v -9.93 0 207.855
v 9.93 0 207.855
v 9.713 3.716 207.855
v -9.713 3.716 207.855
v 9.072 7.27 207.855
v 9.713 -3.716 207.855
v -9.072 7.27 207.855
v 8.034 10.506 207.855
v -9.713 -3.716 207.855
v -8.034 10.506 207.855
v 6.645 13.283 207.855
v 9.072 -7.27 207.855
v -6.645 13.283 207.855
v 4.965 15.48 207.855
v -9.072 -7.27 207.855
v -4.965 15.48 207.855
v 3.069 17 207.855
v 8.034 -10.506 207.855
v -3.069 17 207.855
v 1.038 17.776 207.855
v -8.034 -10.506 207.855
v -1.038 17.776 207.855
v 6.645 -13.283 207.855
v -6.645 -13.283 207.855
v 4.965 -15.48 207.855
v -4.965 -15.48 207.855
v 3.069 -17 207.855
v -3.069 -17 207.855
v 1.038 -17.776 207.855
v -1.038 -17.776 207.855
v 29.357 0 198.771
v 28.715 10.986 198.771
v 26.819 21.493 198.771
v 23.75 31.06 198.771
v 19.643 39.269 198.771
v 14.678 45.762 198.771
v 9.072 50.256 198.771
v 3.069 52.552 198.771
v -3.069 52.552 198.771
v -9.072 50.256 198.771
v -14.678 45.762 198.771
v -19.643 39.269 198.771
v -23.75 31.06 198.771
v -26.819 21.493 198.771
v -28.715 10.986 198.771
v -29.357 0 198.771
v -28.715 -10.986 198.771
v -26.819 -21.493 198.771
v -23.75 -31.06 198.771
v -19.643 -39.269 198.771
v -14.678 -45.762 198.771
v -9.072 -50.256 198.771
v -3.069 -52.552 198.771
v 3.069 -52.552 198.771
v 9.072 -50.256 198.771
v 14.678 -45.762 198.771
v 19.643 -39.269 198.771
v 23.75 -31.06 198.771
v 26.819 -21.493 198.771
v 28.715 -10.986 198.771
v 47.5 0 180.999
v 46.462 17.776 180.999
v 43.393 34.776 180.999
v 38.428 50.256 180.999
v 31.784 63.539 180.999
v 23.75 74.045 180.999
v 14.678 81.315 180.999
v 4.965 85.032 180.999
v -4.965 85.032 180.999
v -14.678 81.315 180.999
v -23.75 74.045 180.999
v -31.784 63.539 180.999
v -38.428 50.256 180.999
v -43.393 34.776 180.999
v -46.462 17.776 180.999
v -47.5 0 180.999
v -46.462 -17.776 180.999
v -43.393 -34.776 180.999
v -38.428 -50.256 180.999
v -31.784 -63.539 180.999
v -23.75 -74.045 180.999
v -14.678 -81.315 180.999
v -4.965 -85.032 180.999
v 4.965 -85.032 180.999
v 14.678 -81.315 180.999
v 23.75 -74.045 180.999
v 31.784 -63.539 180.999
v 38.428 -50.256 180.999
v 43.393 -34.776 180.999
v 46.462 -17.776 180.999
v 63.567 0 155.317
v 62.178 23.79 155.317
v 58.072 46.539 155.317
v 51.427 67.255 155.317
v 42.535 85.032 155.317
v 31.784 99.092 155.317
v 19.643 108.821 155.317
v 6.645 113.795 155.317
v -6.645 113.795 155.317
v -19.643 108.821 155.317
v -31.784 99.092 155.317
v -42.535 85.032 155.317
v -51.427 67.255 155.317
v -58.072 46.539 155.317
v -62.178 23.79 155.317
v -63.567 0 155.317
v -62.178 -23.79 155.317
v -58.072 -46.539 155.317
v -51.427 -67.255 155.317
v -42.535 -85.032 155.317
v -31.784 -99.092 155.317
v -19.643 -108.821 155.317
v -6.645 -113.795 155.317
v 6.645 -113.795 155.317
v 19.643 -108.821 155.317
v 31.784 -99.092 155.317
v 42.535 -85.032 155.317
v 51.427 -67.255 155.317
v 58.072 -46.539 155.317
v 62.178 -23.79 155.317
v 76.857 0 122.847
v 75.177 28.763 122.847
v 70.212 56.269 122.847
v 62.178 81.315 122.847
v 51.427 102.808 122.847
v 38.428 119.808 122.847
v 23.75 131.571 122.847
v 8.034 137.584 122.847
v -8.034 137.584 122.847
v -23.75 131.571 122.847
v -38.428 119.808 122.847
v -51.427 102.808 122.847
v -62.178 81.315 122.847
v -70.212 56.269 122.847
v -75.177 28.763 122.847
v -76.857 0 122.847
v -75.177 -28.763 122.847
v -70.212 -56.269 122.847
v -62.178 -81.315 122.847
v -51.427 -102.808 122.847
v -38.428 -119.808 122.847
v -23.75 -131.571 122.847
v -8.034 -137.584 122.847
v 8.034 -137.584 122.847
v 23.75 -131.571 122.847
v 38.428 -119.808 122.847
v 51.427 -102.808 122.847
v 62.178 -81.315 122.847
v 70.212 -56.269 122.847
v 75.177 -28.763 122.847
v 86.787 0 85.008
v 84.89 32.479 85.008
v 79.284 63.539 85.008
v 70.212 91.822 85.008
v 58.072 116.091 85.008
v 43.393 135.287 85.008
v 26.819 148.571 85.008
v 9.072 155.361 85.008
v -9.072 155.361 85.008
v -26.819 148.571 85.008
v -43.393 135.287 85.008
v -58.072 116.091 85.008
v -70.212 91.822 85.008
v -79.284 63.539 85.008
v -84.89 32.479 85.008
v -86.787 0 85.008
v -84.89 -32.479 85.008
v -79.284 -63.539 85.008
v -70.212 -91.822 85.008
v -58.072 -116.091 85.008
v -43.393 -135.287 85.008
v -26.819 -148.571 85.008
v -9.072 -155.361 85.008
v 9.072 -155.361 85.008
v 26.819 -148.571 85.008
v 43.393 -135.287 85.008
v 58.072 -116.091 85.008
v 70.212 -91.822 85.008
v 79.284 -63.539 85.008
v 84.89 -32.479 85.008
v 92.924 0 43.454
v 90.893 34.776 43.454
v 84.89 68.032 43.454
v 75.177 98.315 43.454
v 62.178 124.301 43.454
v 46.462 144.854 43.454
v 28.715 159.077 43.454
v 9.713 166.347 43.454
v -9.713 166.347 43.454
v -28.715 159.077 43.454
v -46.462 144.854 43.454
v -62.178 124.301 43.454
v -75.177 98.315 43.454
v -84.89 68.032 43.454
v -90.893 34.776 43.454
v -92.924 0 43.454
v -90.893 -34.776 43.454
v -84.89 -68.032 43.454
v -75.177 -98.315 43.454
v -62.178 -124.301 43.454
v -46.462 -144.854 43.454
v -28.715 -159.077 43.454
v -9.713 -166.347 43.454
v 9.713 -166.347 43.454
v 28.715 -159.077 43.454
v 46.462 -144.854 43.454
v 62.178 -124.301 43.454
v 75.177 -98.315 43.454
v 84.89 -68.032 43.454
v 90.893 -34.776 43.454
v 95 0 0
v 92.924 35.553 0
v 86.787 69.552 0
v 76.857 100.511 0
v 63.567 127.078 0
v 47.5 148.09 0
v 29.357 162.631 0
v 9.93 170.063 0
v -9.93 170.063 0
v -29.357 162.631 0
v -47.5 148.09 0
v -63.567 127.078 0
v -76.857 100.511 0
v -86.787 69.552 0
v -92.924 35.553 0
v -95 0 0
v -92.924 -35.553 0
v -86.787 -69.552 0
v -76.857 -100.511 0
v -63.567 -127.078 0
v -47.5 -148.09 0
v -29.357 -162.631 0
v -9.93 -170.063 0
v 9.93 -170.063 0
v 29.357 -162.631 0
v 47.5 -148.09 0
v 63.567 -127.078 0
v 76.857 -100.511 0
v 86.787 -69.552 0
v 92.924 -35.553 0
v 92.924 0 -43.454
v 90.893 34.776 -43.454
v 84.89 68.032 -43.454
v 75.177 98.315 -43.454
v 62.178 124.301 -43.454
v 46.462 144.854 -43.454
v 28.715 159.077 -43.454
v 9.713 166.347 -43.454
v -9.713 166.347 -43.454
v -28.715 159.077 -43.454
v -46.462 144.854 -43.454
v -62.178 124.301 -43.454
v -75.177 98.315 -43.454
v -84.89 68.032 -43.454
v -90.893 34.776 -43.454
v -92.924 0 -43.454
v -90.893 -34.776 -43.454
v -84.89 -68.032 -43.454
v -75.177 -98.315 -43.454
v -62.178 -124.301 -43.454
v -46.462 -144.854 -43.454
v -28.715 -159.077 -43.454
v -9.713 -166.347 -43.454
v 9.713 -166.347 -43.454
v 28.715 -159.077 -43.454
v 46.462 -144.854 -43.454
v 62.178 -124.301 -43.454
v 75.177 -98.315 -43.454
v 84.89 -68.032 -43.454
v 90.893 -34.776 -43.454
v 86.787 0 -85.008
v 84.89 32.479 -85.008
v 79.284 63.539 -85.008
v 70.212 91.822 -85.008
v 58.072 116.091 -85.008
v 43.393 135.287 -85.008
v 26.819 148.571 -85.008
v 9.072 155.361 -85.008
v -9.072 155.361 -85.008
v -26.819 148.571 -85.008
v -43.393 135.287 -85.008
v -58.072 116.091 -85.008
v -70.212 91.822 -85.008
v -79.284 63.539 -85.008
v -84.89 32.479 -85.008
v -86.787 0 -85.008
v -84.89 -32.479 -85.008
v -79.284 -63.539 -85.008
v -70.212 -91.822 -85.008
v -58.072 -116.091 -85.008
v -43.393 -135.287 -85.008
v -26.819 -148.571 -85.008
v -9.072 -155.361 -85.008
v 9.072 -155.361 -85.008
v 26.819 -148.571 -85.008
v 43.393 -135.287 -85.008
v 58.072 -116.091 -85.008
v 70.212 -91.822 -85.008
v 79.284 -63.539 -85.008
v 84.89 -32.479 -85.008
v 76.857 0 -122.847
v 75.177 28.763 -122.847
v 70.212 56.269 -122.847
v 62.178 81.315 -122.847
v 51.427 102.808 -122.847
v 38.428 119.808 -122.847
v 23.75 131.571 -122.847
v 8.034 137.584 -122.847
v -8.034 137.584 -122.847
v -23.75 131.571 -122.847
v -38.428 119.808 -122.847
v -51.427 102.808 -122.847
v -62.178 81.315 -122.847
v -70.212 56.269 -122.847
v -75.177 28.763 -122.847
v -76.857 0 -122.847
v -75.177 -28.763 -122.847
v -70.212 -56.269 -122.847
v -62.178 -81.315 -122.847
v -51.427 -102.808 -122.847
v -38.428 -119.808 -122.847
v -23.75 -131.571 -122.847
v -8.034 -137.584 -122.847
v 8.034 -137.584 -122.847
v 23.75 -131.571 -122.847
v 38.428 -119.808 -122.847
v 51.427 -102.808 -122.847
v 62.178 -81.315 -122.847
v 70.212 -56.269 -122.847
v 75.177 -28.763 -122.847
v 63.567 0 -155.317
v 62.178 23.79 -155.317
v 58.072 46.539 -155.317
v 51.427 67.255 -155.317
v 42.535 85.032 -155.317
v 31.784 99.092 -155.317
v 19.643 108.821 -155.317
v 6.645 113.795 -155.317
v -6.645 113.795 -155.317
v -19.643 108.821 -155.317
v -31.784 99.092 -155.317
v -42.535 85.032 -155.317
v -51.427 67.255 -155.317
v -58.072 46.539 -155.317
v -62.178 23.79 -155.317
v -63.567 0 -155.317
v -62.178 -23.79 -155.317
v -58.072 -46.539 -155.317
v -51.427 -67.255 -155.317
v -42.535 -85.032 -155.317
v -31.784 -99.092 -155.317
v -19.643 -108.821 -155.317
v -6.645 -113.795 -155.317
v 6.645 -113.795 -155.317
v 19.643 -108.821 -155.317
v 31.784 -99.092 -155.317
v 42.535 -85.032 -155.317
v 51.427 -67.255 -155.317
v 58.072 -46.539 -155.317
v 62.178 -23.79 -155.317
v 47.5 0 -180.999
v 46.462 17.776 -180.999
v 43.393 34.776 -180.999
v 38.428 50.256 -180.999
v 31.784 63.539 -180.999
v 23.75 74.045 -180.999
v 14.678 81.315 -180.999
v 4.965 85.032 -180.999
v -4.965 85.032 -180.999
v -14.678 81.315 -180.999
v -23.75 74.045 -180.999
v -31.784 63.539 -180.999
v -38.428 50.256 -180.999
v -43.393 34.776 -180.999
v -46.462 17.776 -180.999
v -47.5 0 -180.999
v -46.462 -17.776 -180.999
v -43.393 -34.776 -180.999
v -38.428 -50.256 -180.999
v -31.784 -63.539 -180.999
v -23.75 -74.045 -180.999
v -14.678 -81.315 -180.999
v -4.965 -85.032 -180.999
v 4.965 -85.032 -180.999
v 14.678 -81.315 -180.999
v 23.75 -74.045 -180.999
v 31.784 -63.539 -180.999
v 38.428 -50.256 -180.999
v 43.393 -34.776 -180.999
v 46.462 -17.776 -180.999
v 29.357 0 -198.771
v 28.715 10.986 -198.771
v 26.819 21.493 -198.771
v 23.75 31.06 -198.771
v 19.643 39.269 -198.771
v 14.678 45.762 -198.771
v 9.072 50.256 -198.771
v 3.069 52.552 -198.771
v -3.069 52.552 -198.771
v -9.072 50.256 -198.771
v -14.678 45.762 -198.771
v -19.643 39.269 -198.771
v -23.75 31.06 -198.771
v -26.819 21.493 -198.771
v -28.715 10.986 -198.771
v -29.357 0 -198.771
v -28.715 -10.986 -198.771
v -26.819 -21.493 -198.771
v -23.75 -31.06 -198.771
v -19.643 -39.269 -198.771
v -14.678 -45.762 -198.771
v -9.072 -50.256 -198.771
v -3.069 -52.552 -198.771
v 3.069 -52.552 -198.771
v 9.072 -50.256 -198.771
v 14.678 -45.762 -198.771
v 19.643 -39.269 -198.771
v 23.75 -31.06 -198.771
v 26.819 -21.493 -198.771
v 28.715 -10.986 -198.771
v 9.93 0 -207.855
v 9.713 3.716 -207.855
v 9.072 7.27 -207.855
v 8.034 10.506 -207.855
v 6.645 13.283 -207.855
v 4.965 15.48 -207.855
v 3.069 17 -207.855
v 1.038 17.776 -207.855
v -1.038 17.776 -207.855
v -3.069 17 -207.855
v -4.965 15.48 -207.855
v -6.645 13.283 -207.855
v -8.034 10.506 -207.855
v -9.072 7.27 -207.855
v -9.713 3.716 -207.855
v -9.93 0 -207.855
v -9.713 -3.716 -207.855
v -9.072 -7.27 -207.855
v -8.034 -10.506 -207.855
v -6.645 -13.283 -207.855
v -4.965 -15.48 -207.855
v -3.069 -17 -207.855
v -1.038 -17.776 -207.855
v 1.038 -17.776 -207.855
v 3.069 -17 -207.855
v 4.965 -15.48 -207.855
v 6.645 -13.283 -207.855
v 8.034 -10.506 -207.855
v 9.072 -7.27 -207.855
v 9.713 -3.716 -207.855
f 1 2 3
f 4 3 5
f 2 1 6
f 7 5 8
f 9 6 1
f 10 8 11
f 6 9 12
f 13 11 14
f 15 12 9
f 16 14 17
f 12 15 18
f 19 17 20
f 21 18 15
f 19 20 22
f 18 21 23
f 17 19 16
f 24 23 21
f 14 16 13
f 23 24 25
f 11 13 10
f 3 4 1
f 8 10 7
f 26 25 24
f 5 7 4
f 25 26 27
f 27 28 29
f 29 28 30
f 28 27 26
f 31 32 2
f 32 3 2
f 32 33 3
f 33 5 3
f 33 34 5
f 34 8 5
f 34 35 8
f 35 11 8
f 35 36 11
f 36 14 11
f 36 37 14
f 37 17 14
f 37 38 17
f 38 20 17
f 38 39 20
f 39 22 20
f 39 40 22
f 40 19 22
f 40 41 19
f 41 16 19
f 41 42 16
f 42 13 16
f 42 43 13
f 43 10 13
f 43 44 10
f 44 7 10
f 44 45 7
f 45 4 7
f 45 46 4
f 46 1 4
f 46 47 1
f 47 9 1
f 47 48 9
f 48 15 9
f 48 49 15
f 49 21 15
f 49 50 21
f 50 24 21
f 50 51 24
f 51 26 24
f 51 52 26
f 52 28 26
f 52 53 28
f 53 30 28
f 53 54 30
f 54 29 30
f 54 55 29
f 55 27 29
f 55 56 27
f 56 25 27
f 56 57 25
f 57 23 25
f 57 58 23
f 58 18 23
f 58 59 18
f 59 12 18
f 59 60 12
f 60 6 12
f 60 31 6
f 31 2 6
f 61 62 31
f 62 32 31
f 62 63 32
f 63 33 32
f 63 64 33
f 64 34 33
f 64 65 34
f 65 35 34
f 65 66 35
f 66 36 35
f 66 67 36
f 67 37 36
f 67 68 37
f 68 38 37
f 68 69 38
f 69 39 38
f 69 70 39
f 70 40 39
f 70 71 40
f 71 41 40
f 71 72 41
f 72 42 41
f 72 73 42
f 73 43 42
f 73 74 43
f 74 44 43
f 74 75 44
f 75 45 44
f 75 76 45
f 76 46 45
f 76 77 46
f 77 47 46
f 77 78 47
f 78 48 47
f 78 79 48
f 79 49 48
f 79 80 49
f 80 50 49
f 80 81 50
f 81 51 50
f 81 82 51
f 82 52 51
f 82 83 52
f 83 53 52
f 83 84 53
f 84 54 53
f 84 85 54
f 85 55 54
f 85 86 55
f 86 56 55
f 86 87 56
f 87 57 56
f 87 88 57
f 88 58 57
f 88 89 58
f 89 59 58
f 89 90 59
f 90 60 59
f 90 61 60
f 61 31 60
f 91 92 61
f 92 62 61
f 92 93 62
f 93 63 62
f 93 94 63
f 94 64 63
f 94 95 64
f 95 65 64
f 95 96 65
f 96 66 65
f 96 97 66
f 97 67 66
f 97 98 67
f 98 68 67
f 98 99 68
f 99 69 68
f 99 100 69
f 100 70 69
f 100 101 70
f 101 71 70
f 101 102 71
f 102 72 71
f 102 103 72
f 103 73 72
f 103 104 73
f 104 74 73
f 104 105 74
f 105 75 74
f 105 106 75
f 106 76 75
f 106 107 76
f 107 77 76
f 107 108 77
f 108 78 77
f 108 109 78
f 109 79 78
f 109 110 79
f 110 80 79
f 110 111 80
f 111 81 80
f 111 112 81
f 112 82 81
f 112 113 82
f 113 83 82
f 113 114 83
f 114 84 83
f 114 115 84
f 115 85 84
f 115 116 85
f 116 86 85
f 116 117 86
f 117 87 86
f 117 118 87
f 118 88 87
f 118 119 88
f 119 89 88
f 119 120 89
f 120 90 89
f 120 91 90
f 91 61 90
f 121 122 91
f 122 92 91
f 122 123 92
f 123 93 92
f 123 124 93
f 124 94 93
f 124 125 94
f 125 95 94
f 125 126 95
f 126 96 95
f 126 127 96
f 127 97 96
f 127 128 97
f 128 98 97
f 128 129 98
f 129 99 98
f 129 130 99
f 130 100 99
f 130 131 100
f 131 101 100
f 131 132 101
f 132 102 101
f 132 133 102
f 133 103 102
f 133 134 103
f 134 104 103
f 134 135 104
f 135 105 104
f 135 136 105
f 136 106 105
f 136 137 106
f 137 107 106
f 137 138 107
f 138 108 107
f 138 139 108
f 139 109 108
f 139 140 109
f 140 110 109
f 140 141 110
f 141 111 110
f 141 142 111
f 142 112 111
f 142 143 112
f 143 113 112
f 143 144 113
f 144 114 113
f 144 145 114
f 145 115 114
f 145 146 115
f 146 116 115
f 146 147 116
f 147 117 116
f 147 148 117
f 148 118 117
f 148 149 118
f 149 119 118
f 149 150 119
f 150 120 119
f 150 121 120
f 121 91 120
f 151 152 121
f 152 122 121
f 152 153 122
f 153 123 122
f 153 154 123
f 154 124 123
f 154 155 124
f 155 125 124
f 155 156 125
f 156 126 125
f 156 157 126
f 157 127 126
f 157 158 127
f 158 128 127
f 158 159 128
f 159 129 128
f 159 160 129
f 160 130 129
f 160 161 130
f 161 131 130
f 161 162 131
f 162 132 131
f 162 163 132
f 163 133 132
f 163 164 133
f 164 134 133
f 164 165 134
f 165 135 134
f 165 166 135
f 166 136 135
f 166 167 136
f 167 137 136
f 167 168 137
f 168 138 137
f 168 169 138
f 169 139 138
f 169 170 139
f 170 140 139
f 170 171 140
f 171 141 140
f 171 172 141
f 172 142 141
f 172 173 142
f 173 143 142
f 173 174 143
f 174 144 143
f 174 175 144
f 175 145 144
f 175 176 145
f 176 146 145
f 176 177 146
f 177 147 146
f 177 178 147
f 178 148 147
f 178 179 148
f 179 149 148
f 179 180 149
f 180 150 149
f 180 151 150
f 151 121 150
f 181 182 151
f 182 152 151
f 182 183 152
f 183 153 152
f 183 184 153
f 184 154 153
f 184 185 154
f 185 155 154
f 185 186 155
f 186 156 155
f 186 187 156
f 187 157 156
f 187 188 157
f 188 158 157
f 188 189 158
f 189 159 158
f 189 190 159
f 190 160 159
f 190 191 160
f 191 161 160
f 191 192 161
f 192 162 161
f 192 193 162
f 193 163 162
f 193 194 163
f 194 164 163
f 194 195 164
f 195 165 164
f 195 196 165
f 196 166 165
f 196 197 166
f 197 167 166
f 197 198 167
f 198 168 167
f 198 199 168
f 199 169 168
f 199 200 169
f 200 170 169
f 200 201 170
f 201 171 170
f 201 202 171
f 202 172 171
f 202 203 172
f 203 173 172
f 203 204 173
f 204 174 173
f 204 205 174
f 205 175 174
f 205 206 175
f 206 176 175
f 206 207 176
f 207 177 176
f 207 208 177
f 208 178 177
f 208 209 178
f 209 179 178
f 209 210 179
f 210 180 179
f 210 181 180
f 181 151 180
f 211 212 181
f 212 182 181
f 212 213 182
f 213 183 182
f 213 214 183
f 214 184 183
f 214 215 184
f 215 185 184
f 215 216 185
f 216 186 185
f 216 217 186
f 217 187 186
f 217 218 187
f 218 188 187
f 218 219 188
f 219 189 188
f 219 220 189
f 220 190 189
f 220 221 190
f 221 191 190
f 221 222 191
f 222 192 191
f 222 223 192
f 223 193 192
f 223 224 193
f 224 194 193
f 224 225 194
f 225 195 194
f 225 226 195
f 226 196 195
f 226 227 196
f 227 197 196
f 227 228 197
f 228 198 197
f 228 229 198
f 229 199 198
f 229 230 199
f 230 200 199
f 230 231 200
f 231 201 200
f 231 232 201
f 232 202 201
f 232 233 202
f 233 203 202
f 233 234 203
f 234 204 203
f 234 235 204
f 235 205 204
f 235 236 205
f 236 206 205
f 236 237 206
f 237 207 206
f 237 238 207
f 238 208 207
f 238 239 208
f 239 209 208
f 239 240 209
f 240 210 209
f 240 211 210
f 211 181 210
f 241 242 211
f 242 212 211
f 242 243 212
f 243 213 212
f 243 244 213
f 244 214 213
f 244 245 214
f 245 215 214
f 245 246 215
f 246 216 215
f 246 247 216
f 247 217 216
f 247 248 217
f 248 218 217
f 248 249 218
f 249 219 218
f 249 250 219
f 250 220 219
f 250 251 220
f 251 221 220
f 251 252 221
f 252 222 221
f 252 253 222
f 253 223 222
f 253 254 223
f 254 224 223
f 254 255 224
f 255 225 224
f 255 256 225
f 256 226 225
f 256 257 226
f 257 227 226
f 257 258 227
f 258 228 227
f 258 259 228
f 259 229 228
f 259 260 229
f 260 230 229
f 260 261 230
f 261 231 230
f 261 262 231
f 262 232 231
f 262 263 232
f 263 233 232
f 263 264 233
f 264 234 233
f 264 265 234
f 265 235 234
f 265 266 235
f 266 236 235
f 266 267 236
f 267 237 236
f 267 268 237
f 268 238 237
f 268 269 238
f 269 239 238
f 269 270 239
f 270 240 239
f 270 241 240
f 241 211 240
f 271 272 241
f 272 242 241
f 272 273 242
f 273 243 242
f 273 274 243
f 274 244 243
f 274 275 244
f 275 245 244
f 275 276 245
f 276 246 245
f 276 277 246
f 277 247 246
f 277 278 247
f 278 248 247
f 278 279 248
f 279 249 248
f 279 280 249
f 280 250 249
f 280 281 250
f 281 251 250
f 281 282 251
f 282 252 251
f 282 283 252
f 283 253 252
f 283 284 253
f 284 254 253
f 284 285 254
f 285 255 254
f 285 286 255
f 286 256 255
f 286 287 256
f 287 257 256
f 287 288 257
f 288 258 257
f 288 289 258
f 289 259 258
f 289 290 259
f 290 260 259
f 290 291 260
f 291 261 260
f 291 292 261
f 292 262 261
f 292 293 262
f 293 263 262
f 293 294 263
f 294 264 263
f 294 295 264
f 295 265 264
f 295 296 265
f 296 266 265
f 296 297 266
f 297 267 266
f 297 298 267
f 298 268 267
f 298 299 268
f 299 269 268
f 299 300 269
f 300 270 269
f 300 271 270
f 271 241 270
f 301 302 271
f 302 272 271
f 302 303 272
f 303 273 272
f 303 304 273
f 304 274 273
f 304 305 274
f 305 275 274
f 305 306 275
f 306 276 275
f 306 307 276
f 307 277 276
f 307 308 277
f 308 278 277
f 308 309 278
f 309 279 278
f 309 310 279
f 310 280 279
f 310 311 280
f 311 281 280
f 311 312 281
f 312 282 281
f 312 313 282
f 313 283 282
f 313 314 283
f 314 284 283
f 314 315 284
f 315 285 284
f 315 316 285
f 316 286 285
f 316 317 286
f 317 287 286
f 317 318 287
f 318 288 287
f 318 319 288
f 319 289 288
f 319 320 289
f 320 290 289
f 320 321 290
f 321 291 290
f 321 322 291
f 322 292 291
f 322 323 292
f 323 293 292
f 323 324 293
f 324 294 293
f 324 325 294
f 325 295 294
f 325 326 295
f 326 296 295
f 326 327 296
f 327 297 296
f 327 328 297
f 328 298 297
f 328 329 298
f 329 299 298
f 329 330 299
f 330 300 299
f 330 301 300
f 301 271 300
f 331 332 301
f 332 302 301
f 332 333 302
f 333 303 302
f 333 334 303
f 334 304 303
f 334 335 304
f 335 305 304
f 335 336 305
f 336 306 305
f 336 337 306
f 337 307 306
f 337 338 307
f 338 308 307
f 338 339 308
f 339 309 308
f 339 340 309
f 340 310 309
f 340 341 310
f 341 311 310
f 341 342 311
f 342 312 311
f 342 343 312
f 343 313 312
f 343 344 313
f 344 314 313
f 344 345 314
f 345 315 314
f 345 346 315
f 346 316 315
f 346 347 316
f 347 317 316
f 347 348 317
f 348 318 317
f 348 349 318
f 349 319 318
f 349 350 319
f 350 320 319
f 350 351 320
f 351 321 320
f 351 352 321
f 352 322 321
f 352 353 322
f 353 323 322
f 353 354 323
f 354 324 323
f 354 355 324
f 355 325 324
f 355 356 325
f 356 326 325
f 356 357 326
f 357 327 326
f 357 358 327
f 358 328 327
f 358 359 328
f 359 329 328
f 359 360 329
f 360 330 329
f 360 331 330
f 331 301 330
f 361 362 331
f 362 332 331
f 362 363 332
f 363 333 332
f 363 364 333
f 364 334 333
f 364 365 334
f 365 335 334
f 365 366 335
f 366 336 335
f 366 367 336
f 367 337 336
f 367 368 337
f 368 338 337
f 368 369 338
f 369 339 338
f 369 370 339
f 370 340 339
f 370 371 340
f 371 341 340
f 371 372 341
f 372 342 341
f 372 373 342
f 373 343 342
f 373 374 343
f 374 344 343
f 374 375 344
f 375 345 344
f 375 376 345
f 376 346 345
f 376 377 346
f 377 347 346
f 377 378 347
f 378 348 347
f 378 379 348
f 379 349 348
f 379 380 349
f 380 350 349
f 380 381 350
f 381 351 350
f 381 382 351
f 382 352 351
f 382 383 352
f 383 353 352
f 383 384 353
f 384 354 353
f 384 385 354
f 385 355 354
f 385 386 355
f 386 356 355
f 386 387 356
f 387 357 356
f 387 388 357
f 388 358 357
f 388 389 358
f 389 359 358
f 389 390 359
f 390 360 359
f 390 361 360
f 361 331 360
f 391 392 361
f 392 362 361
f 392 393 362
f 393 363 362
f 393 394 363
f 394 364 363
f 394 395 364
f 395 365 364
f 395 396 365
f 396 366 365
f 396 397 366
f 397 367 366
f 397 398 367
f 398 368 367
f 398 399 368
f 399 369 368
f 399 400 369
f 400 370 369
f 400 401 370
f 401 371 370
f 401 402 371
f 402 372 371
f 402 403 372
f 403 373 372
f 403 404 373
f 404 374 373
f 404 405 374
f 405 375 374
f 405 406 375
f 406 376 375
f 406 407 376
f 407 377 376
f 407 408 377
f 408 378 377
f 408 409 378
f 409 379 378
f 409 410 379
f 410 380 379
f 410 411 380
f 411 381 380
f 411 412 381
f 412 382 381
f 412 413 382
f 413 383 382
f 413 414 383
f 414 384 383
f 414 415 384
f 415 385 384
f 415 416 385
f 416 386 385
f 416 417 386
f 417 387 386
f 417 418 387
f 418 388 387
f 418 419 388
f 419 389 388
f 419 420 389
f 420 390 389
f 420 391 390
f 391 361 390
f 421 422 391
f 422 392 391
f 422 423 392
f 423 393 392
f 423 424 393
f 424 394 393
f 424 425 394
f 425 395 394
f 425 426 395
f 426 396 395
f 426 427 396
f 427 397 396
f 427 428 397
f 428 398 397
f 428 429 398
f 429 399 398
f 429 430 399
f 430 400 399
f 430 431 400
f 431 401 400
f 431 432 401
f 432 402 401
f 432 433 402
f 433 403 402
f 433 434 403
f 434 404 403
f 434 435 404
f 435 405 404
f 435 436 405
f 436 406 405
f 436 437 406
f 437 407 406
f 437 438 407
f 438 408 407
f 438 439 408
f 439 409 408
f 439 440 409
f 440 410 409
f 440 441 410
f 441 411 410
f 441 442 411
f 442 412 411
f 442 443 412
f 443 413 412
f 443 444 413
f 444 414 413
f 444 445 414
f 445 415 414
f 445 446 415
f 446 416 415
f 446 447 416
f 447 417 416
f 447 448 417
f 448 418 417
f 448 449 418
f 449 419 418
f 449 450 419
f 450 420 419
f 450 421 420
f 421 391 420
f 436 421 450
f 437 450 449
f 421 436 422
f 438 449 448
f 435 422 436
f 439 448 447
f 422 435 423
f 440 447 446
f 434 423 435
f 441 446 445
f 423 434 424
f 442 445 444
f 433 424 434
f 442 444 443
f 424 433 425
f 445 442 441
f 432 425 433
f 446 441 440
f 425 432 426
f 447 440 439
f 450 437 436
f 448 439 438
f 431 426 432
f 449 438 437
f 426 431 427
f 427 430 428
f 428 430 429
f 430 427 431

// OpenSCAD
// Generated by SolidPython 1.0.1 on 2020-07-29 00:39:26


scale(v = [5, 9, 11]) {
	sphere(r = 19);
}
/***********************************************
*********      SolidPython code:      **********
************************************************
 
# import packages: SolidPython
from solid import *
from solid.utils import *
from itertools import chain, combinations


class Resize:

    def __init__(self, scad_file):
        self.scad_file = scad_file
        #self.scad_file = import_scad(scad_file)
        # cone/cylinder param:
        self.r1 = 0
        self.r2 = 0
        self.h = 0
        # rectangular prism param:
        self.w = 0
        self.l = 0
        # ellipse param:
        self.r = 0

    # import OpenScad code (file name corresponds to shape)


    # classify shape + parameters
    def assign(self, param1, param2, param3):
        if self.scad_file == 'cone.scad':
            self.r1 = param1
            self.r2 = param2
            self.h = param3
        elif self.scad_file == 'cylinder.scad':
            self.r1 = param1
            self.r2 = param2
            self.h = param3
        elif self.scad_file == 'rectangularPrism.scad':
            self.h = param1
            self.l = param2
            self.w = param3
        else:
            self.r = param1
            self.h = param2

    # resize parameters
    def iterate(self):
        x = range(3, 20, 2)
        i = 1
        if self.scad_file == 'cone.scad':
            tempList = list(combinations(x, 2))
            for temp in tempList:
                param1 = temp[0]
                param2 = temp[1]
                filepath = 'produced_scad_files/' + 'cone' + str(param1) + '_' + str(param2) + '_' + '.scad'
                scad_render_to_file(cylinder(h=param1, r1=param2, r2=0), filepath)

        elif self.scad_file == 'cylinder.scad':
            tempList = list(combinations(x, 3))
            for temp in tempList:
                param1 = temp[0]
                param2 = temp[1]
                filepath = 'produced_scad_files/' + 'cylinder' + str(param1) + '_' + str(param2) + '_' + '.scad'
                scad_render_to_file(cylinder(h=param1, r1=param2, r2=param2), filepath)

        elif self.scad_file == 'rectangularPrism.scad':
            tempList = list(combinations(x, 3))
            for temp in tempList:
                param1 = temp[0]
                param2 = temp[1]
                param3 = temp[2]
                filepath = 'produced_scad_files/' + 'rectangularPrism' + str(param1) + '_' + str(param2) + '_' + str(
                    param3) + '.scad'
                scad_render_to_file(cube(size=(param1, param2, param3)), filepath)

        elif self.scad_file == 'ellipse.scad':
            tempList = list(combinations(x, 4))
            for temp in tempList:
                param1 = temp[0]
                param2 = temp[1]
                param3 = temp[2]
                param4 = temp[3]
                filepath = 'produced_scad_files/' + 'ellipse' + str(param1) + '_' + str(param2) + '_' + str(param3) + '_' + str(param4) + '.scad'
                scad_render_to_file(scale([param1, param2, param3])(sphere(r=param4)), filepath)

    def render_to_scadfile(self):
        scad_render_to_file(scad, 'example.scad') 
 
************************************************/
